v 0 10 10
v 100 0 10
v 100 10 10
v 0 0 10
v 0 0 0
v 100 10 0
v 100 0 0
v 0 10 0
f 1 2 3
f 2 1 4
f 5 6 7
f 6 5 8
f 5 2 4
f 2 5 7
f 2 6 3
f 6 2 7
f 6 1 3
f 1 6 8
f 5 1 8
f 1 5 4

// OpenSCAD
length = 1000; //v desetinach mm - kvuli pojmenovani souboru
base = 10;

cube(size=[length / 10, base, base], center=false);
